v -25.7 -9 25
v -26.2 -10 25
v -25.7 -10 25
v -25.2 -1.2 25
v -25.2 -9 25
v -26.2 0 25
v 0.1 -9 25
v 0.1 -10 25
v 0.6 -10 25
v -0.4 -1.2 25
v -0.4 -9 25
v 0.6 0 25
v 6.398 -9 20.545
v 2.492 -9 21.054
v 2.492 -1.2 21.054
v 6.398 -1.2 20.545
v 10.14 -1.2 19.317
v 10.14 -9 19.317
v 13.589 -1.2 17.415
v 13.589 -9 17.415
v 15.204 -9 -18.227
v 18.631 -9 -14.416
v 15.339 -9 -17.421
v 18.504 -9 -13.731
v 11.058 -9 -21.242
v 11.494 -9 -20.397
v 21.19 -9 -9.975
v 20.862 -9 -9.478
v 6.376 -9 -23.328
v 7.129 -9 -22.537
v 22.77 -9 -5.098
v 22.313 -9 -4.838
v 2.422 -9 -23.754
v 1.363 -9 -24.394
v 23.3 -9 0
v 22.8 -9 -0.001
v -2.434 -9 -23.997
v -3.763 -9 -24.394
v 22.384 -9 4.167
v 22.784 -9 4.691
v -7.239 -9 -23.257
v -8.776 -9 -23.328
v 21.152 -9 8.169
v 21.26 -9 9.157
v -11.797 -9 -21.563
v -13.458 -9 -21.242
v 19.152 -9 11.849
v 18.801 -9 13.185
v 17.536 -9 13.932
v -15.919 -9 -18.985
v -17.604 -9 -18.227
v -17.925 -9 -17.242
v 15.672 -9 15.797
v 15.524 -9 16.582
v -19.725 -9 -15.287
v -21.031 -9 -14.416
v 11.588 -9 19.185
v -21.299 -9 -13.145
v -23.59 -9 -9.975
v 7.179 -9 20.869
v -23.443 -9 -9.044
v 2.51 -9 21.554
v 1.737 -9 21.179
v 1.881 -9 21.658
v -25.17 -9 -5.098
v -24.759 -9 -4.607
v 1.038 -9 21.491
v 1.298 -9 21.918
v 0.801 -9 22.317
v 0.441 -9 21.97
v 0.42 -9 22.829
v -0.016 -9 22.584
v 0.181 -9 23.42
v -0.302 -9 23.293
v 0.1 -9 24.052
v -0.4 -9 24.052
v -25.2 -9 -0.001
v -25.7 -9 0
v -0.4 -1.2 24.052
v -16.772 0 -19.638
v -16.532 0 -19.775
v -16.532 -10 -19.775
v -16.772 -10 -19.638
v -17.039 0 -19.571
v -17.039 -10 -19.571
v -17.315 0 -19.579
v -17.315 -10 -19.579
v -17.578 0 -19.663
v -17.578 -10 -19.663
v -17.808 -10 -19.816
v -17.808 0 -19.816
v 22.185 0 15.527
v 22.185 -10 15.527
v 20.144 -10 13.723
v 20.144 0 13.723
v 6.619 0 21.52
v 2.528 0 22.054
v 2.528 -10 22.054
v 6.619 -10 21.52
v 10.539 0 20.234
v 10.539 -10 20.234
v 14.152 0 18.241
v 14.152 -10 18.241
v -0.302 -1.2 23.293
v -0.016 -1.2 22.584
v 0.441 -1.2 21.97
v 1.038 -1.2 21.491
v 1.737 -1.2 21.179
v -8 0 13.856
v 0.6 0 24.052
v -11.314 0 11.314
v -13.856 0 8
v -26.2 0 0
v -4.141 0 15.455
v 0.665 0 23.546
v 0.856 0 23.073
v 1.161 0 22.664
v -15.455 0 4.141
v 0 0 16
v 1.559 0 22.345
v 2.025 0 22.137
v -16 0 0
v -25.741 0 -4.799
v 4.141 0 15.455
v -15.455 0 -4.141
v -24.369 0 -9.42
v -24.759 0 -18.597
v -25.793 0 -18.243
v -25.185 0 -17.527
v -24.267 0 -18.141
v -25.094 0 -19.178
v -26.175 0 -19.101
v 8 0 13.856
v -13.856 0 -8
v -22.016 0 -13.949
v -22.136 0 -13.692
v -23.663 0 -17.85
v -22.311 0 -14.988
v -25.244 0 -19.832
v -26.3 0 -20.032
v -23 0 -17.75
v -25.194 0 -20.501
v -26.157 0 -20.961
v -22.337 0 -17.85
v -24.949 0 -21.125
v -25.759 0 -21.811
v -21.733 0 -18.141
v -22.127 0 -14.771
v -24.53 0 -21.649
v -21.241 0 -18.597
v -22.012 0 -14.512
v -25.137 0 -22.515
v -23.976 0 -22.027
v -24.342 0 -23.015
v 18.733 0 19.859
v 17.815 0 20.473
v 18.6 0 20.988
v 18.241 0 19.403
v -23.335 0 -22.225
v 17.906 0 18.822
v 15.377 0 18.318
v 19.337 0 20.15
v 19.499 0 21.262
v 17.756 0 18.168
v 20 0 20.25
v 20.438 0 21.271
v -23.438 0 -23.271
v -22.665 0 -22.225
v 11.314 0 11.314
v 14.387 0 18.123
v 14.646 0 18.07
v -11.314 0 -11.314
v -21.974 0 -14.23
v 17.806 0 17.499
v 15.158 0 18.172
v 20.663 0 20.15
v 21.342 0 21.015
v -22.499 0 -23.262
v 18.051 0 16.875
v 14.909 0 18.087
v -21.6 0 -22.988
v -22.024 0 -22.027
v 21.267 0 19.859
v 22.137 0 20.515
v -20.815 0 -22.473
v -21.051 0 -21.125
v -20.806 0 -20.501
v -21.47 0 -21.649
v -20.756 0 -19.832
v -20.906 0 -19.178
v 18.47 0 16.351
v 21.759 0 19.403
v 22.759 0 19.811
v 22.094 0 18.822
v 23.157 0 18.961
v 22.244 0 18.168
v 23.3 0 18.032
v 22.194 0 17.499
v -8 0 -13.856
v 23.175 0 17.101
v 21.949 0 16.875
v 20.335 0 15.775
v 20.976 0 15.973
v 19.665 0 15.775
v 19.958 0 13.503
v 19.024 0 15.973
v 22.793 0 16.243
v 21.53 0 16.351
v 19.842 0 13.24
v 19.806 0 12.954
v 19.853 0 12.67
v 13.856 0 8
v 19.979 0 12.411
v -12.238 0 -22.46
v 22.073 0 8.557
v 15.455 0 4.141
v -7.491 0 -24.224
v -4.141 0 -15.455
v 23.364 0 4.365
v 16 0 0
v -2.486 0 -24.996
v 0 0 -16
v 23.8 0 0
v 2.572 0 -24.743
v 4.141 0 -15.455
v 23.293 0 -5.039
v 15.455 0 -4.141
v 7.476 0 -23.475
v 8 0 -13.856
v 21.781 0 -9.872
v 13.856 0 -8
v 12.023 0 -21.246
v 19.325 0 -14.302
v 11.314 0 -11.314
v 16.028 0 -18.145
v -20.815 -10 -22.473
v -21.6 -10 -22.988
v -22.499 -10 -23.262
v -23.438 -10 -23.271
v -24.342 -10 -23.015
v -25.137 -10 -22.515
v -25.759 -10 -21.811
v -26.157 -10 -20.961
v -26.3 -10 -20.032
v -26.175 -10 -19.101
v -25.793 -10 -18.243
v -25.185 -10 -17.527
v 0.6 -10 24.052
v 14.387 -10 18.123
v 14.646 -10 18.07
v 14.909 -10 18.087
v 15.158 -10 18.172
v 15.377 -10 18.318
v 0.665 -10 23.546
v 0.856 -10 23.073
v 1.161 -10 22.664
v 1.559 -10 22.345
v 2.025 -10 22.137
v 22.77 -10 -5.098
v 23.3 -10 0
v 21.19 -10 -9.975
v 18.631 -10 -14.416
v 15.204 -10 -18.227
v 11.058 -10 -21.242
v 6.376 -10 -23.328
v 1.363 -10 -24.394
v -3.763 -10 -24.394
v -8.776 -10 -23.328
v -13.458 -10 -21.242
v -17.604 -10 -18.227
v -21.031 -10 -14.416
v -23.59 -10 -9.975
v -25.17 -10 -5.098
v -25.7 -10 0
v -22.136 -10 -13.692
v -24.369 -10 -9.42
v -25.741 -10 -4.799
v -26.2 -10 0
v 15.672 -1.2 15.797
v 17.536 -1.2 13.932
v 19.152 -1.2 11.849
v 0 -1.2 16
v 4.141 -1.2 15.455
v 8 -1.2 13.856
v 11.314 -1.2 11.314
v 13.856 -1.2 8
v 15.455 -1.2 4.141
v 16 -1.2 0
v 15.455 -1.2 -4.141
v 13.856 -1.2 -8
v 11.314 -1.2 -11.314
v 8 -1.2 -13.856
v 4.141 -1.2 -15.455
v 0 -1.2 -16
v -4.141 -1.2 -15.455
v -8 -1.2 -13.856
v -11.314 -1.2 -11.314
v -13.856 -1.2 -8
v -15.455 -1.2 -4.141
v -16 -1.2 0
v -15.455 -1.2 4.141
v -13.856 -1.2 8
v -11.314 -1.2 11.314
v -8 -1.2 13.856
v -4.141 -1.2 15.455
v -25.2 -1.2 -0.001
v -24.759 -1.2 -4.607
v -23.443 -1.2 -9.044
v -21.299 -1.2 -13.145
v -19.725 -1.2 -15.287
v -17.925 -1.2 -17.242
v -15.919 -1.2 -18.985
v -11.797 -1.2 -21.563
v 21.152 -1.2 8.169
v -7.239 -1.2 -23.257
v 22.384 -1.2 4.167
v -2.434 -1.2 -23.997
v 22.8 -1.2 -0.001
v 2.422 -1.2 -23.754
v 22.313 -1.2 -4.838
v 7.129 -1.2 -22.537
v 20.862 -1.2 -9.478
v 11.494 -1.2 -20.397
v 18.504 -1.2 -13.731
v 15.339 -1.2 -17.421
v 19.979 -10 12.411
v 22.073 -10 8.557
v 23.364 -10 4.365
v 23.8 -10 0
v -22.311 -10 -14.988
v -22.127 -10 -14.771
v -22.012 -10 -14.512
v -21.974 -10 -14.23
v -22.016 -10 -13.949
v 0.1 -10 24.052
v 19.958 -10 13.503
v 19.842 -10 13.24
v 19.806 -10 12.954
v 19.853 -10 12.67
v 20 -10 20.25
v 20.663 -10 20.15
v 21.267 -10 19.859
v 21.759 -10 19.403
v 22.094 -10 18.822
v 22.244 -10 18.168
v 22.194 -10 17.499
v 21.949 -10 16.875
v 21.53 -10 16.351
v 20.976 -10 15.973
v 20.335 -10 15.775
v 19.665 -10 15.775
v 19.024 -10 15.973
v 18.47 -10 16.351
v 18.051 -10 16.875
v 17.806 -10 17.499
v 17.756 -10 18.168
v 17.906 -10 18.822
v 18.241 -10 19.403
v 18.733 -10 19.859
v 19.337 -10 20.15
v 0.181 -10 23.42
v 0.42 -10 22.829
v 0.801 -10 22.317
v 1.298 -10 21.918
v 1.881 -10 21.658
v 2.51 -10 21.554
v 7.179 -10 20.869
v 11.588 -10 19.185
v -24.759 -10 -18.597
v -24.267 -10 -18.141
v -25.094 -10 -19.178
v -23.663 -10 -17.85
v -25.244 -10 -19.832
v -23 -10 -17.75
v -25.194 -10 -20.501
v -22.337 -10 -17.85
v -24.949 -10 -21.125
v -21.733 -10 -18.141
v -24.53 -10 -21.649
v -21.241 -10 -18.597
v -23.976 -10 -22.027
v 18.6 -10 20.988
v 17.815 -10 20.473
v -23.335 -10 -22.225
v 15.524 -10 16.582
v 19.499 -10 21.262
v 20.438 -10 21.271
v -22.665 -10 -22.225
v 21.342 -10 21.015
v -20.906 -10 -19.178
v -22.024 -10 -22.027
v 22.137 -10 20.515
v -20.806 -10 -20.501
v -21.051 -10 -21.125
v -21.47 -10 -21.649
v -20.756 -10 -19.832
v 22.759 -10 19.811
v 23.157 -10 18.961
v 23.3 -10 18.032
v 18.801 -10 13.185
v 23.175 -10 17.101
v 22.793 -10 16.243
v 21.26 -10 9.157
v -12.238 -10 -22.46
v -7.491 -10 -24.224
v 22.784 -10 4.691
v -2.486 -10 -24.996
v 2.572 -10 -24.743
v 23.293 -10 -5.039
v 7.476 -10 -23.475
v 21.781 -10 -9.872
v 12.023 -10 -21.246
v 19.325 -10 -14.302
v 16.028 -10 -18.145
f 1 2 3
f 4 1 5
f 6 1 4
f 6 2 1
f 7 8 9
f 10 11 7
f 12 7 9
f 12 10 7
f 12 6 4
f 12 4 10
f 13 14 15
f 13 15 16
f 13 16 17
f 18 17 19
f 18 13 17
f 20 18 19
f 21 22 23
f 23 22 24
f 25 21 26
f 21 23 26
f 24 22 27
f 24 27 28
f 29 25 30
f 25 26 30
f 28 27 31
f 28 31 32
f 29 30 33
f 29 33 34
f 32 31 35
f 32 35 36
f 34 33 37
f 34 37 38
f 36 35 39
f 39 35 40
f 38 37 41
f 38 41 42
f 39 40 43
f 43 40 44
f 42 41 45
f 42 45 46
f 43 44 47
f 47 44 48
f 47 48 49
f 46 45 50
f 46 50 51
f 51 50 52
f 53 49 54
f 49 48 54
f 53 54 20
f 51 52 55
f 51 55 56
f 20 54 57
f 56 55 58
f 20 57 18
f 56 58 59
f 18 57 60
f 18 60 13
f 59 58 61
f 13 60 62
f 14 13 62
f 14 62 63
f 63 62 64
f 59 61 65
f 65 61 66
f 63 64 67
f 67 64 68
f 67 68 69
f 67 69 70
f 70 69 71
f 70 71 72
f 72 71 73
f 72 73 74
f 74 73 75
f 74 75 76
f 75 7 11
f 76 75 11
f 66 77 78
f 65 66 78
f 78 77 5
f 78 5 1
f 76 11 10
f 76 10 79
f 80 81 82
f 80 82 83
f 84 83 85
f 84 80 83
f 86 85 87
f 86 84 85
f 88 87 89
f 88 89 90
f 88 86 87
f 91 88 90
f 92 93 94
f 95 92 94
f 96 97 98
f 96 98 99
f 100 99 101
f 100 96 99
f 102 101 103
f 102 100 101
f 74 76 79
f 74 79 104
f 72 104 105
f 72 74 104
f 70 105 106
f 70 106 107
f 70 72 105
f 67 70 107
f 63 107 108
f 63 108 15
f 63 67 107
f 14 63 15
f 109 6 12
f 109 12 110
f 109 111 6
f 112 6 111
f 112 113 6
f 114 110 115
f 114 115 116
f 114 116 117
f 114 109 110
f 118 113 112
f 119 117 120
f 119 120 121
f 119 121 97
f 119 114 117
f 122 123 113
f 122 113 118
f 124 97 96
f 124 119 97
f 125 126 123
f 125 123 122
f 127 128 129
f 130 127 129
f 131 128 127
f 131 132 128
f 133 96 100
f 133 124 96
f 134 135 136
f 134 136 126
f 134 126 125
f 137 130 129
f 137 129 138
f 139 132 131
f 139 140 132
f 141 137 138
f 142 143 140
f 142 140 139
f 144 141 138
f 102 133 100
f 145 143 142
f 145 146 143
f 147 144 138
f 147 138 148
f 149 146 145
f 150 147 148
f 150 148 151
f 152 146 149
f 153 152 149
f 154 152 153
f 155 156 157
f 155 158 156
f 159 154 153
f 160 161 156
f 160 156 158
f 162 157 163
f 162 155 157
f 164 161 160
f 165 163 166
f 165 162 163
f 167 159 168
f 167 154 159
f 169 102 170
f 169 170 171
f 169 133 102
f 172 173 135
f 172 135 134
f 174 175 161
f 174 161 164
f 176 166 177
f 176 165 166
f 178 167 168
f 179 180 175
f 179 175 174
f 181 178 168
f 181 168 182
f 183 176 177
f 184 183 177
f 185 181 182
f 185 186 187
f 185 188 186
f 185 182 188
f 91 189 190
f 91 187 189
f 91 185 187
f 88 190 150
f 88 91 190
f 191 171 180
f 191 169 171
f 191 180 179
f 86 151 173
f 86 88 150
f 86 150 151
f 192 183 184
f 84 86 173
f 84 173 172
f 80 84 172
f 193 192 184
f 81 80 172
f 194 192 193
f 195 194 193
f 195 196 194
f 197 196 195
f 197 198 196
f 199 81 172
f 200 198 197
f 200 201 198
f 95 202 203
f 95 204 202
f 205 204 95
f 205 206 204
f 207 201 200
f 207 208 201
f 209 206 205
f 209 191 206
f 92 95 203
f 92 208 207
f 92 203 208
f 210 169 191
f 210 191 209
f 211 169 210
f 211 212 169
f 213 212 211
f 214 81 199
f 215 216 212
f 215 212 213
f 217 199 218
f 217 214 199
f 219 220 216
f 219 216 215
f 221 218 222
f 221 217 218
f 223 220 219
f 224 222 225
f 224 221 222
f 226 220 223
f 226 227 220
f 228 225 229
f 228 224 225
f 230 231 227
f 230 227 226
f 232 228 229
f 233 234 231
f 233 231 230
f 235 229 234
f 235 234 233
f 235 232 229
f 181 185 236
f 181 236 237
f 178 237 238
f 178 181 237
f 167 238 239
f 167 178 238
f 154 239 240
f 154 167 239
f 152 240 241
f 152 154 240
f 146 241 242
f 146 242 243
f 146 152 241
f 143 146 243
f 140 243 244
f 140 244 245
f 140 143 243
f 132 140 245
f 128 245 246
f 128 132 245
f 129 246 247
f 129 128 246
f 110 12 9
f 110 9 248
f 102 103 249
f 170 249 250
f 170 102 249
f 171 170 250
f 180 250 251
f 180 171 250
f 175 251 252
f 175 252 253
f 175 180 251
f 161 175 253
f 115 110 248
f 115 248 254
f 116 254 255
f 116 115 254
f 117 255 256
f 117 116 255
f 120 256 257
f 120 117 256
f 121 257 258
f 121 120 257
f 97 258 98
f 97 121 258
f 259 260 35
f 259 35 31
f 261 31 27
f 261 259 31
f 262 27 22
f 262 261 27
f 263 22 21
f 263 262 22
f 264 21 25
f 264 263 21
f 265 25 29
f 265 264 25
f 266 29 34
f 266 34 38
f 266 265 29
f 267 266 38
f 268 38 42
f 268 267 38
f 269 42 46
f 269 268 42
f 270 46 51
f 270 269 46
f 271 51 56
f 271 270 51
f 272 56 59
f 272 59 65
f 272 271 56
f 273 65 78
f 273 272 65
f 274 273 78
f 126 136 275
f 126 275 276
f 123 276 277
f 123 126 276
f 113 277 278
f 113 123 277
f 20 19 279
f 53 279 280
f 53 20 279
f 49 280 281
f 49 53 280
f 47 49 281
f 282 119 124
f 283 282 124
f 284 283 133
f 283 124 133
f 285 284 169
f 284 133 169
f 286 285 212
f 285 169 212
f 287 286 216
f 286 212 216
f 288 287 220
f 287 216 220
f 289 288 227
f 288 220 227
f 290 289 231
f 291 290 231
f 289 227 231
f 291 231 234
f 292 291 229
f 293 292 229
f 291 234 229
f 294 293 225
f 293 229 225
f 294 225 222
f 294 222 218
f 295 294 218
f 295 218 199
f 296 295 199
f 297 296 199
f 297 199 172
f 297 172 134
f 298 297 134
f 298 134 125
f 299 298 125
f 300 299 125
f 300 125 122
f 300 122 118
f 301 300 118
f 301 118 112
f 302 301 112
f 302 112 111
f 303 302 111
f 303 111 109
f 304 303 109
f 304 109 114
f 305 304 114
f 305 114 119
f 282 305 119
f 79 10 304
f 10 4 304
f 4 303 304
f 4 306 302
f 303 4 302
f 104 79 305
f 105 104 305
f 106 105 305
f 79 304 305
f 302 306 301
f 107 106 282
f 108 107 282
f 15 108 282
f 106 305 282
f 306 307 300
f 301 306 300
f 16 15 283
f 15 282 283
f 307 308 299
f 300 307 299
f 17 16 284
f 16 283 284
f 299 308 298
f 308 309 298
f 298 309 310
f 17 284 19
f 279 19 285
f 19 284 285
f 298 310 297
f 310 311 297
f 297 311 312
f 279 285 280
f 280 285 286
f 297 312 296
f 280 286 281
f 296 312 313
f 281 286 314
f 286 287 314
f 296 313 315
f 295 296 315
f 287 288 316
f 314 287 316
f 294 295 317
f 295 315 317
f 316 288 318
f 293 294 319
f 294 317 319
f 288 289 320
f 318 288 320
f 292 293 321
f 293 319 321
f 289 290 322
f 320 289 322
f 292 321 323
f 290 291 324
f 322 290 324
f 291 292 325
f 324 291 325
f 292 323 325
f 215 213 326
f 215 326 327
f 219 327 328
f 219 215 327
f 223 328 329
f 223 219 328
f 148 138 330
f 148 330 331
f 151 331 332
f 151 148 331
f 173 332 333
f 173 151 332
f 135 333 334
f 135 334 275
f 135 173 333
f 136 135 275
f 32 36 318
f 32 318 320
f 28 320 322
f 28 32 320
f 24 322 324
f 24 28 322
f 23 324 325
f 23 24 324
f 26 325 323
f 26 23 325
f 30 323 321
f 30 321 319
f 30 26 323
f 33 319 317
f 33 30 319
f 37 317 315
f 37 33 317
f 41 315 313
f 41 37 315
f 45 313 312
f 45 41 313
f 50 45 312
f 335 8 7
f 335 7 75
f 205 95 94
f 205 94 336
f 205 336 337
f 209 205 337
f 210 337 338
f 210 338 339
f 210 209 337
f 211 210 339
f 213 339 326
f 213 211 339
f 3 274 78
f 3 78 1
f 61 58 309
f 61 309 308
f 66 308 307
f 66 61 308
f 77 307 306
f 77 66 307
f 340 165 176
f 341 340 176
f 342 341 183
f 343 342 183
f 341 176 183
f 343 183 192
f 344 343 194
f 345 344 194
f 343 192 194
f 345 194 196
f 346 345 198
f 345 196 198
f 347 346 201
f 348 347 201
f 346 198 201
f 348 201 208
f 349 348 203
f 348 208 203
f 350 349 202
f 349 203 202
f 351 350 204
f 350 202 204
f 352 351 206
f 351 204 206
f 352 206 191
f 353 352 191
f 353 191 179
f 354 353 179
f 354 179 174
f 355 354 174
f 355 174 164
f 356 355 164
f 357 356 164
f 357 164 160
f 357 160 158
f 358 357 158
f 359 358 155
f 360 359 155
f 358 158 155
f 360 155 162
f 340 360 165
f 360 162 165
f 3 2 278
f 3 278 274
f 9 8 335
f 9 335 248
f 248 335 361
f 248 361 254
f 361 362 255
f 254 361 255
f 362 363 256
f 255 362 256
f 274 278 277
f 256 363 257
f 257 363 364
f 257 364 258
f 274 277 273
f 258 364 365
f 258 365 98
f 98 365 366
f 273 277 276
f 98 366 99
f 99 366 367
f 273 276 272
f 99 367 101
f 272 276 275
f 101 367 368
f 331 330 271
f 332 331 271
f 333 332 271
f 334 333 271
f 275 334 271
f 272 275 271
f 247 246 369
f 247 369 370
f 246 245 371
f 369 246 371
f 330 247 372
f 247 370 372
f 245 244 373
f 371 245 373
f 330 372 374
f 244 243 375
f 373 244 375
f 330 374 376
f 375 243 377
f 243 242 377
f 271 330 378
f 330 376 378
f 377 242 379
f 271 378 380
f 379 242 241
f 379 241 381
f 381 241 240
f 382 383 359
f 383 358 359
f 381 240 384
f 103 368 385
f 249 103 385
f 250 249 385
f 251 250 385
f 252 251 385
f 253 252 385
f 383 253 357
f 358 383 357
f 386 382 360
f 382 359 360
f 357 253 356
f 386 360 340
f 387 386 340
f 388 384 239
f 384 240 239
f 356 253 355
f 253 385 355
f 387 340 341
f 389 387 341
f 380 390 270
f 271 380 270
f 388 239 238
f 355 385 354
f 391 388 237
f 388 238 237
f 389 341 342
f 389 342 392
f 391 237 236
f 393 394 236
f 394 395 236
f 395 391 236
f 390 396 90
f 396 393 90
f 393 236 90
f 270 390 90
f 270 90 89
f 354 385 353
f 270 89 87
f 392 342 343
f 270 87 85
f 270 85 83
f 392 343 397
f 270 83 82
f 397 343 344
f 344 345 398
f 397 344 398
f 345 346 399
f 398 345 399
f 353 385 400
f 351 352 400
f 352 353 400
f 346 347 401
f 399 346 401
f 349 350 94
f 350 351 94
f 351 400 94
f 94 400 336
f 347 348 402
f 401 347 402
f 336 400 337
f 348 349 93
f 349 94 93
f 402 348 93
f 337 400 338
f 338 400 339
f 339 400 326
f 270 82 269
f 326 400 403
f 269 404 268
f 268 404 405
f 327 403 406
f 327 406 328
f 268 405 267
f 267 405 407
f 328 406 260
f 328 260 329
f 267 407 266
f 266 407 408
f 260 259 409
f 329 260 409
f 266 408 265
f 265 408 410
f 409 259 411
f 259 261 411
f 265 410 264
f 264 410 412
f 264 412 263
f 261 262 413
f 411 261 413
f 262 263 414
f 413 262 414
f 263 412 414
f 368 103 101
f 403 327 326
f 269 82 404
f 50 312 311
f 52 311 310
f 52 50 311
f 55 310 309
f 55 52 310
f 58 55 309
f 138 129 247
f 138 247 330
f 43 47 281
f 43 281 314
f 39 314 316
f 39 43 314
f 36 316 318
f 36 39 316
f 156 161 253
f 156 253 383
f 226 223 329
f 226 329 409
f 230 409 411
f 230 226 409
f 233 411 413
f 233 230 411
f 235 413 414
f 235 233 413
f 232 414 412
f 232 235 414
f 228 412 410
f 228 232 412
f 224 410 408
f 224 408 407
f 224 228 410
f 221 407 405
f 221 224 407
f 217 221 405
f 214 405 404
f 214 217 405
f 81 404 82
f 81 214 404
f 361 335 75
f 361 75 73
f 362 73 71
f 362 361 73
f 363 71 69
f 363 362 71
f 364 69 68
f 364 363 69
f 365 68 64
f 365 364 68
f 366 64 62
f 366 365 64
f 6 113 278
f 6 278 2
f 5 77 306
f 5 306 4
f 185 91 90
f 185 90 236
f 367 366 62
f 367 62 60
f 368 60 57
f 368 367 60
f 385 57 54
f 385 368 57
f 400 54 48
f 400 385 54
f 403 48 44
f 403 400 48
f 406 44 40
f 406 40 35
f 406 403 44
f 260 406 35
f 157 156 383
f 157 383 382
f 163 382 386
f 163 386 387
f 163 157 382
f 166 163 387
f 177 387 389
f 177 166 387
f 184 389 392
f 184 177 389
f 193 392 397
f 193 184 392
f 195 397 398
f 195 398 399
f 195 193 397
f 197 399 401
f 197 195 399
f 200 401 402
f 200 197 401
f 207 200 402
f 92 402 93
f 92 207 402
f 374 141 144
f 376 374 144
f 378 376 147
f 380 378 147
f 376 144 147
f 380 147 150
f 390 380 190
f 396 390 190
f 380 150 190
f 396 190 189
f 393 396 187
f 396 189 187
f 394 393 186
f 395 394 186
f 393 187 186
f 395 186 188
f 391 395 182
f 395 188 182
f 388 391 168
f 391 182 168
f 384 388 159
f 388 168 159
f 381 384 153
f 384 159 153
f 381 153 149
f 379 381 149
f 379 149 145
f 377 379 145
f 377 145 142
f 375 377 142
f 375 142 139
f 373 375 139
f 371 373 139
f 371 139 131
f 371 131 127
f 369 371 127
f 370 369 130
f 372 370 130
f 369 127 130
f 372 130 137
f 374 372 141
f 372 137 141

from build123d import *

# Parameters (mm, degrees)
SKETCH_1_R          = 16
SKETCH_1_R_2        = 2.25
EXTRUDE_1_DEPTH     = 10
CUT_EXTRUDE_1_DEPTH = 8.8
CUT_EXTRUDE_8_DEPTH = 1


with BuildPart() as part:
    # Эскиз1 → Бобышка-Вытянуть1 (new body)
    with BuildSketch(Plane(origin=(0, 0, 0), x_dir=(1, 0, 0), z_dir=(0, 1, 0))):
        with BuildLine():
            Line((-26.2, -25), (0.6, -25))
            Line((0.6, -25), (0.6, -24.052407766))
            ThreePointArc((0.6, -24.052407766), (1.160508995, -22.66393175), (2.527865647, -22.05370903))
            ThreePointArc((2.527865647, -22.05370903), (8.609379582, -20.969032322), (14.151976117, -18.241220202))
            ThreePointArc((14.151976117, -18.241220202), (14.777726241, -18.069792078), (15.376980036, -18.318480053))
            Line((15.376980036, -18.318480053), (17.814747272, -20.472785982))
            ThreePointArc((17.814747272, -20.472785982), (22.472785982, -20.185252728), (22.185252728, -15.527214018))
            Line((22.185252728, -15.527214018), (20.143734708, -13.723081814))
            ThreePointArc((20.143734708, -13.723081814), (19.813719174, -13.098302749), (19.979075206, -12.411340949))
            ThreePointArc((19.979075206, -12.411340949), (22.823148445, -6.493089604), (23.8, 0))
            ThreePointArc((23.8, 0), (9.805861096, 22.475890034), (-16.53246264, 19.775101396))
            ThreePointArc((-16.53246264, 19.775101396), (-17.177514672, 19.565457211), (-17.807958535, 19.815623843))
            Line((-17.807958535, 19.815623843), (-20.814747272, 22.472785982))
            ThreePointArc((-20.814747272, 22.472785982), (-25.472785982, 22.185252728), (-25.185252728, 17.527214018))
            Line((-25.185252728, 17.527214018), (-22.311461479, 14.987584542))
            ThreePointArc((-22.311461479, 14.987584542), (-21.982680627, 14.372275298), (-22.136211376, 13.691738288))
            ThreePointArc((-22.136211376, 13.691738288), (-25.166639381, 7.142239829), (-26.2, 0))
            Line((-26.2, 0), (-26.2, -25))
        make_face()
        with Locations(Location((0, 0, 0), (0, 0, 270))):
            Circle(SKETCH_1_R, mode=Mode.SUBTRACT)
        with Locations(Location((-23, 20, 0), (0, 0, 270))):
            Circle(SKETCH_1_R_2, mode=Mode.SUBTRACT)
        with Locations(Location((20, -18, 0), (0, 0, 270))):
            Circle(SKETCH_1_R_2, mode=Mode.SUBTRACT)
    extrude(amount=-EXTRUDE_1_DEPTH)

    # Эскиз2 → Вырез-Вытянуть1 (cut)
    with BuildSketch(Plane(origin=(0, -10, 0), x_dir=(-1, 0, 0), z_dir=(0, -1, 0))):
        with BuildLine():
            Line((0.4, -25), (0.4, -24.052407766))
            ThreePointArc((0.4, -24.052407766), (-0.440763493, -21.969693742), (-2.491798471, -21.054359663))
            ThreePointArc((-2.491798471, -21.054359663), (-8.297732589, -20.018834368), (-13.589169994, -17.414631267))
            ThreePointArc((-13.589169994, -17.414631267), (-16.632858543, -14.893819788), (-19.152217909, -11.84892917))
            ThreePointArc((-19.152217909, -11.84892917), (-21.867498452, -6.198584635), (-22.799999992, 0.0005752))
            ThreePointArc((-22.799999992, 0.0005752), (-9.365885893, 21.577880063), (15.919164541, 18.985249865))
            ThreePointArc((15.919164541, 18.985249865), (18.852153178, 16.289251545), (21.298763477, 13.145221119))
            ThreePointArc((21.298763477, 13.145221119), (24.208055551, 6.857429147), (25.2, 0.000581878))
            Line((25.2, 0.000581878), (25.2, -25))
            Line((25.2, -25), (0.4, -25))
        make_face()
    extrude(amount=-CUT_EXTRUDE_1_DEPTH, mode=Mode.SUBTRACT)

    # Эскиз11 → Вырез-Вытянуть8 (cut)
    with BuildSketch(Plane.XZ.offset(10)):
        with BuildLine():
            Line((-0.4, 24.052407766), (-0.4, 25))
            Line((-0.4, 25), (0.1, 25))
            Line((0.1, 25), (0.1, 24.052407766))
            ThreePointArc((0.1, 24.052407766), (0.800636244, 22.316812746), (2.509832059, 21.554034346))
            ThreePointArc((2.509832059, 21.554034346), (17.255552057, 14.973268455), (23.299999998, -0.000287804))
            ThreePointArc((23.299999998, -0.000287804), (-1.199999175, -24.528816589), (-25.7, -0.000289454))
            Line((-25.7, -0.000289454), (-25.7, 25))
            Line((-25.7, 25), (-25.2, 25))
            Line((-25.2, 25), (-25.2, -0.000581878))
            ThreePointArc((-25.2, -0.000581878), (-1.199996661, -24.028816589), (22.799999992, -0.0005752))
            ThreePointArc((22.799999992, -0.0005752), (16.895779065, 14.626046024), (2.491798471, 21.054359663))
            ThreePointArc((2.491798471, 21.054359663), (0.440763493, 21.969693742), (-0.4, 24.052407766))
        make_face()
    extrude(amount=-CUT_EXTRUDE_8_DEPTH, mode=Mode.SUBTRACT)


solid = part.part
